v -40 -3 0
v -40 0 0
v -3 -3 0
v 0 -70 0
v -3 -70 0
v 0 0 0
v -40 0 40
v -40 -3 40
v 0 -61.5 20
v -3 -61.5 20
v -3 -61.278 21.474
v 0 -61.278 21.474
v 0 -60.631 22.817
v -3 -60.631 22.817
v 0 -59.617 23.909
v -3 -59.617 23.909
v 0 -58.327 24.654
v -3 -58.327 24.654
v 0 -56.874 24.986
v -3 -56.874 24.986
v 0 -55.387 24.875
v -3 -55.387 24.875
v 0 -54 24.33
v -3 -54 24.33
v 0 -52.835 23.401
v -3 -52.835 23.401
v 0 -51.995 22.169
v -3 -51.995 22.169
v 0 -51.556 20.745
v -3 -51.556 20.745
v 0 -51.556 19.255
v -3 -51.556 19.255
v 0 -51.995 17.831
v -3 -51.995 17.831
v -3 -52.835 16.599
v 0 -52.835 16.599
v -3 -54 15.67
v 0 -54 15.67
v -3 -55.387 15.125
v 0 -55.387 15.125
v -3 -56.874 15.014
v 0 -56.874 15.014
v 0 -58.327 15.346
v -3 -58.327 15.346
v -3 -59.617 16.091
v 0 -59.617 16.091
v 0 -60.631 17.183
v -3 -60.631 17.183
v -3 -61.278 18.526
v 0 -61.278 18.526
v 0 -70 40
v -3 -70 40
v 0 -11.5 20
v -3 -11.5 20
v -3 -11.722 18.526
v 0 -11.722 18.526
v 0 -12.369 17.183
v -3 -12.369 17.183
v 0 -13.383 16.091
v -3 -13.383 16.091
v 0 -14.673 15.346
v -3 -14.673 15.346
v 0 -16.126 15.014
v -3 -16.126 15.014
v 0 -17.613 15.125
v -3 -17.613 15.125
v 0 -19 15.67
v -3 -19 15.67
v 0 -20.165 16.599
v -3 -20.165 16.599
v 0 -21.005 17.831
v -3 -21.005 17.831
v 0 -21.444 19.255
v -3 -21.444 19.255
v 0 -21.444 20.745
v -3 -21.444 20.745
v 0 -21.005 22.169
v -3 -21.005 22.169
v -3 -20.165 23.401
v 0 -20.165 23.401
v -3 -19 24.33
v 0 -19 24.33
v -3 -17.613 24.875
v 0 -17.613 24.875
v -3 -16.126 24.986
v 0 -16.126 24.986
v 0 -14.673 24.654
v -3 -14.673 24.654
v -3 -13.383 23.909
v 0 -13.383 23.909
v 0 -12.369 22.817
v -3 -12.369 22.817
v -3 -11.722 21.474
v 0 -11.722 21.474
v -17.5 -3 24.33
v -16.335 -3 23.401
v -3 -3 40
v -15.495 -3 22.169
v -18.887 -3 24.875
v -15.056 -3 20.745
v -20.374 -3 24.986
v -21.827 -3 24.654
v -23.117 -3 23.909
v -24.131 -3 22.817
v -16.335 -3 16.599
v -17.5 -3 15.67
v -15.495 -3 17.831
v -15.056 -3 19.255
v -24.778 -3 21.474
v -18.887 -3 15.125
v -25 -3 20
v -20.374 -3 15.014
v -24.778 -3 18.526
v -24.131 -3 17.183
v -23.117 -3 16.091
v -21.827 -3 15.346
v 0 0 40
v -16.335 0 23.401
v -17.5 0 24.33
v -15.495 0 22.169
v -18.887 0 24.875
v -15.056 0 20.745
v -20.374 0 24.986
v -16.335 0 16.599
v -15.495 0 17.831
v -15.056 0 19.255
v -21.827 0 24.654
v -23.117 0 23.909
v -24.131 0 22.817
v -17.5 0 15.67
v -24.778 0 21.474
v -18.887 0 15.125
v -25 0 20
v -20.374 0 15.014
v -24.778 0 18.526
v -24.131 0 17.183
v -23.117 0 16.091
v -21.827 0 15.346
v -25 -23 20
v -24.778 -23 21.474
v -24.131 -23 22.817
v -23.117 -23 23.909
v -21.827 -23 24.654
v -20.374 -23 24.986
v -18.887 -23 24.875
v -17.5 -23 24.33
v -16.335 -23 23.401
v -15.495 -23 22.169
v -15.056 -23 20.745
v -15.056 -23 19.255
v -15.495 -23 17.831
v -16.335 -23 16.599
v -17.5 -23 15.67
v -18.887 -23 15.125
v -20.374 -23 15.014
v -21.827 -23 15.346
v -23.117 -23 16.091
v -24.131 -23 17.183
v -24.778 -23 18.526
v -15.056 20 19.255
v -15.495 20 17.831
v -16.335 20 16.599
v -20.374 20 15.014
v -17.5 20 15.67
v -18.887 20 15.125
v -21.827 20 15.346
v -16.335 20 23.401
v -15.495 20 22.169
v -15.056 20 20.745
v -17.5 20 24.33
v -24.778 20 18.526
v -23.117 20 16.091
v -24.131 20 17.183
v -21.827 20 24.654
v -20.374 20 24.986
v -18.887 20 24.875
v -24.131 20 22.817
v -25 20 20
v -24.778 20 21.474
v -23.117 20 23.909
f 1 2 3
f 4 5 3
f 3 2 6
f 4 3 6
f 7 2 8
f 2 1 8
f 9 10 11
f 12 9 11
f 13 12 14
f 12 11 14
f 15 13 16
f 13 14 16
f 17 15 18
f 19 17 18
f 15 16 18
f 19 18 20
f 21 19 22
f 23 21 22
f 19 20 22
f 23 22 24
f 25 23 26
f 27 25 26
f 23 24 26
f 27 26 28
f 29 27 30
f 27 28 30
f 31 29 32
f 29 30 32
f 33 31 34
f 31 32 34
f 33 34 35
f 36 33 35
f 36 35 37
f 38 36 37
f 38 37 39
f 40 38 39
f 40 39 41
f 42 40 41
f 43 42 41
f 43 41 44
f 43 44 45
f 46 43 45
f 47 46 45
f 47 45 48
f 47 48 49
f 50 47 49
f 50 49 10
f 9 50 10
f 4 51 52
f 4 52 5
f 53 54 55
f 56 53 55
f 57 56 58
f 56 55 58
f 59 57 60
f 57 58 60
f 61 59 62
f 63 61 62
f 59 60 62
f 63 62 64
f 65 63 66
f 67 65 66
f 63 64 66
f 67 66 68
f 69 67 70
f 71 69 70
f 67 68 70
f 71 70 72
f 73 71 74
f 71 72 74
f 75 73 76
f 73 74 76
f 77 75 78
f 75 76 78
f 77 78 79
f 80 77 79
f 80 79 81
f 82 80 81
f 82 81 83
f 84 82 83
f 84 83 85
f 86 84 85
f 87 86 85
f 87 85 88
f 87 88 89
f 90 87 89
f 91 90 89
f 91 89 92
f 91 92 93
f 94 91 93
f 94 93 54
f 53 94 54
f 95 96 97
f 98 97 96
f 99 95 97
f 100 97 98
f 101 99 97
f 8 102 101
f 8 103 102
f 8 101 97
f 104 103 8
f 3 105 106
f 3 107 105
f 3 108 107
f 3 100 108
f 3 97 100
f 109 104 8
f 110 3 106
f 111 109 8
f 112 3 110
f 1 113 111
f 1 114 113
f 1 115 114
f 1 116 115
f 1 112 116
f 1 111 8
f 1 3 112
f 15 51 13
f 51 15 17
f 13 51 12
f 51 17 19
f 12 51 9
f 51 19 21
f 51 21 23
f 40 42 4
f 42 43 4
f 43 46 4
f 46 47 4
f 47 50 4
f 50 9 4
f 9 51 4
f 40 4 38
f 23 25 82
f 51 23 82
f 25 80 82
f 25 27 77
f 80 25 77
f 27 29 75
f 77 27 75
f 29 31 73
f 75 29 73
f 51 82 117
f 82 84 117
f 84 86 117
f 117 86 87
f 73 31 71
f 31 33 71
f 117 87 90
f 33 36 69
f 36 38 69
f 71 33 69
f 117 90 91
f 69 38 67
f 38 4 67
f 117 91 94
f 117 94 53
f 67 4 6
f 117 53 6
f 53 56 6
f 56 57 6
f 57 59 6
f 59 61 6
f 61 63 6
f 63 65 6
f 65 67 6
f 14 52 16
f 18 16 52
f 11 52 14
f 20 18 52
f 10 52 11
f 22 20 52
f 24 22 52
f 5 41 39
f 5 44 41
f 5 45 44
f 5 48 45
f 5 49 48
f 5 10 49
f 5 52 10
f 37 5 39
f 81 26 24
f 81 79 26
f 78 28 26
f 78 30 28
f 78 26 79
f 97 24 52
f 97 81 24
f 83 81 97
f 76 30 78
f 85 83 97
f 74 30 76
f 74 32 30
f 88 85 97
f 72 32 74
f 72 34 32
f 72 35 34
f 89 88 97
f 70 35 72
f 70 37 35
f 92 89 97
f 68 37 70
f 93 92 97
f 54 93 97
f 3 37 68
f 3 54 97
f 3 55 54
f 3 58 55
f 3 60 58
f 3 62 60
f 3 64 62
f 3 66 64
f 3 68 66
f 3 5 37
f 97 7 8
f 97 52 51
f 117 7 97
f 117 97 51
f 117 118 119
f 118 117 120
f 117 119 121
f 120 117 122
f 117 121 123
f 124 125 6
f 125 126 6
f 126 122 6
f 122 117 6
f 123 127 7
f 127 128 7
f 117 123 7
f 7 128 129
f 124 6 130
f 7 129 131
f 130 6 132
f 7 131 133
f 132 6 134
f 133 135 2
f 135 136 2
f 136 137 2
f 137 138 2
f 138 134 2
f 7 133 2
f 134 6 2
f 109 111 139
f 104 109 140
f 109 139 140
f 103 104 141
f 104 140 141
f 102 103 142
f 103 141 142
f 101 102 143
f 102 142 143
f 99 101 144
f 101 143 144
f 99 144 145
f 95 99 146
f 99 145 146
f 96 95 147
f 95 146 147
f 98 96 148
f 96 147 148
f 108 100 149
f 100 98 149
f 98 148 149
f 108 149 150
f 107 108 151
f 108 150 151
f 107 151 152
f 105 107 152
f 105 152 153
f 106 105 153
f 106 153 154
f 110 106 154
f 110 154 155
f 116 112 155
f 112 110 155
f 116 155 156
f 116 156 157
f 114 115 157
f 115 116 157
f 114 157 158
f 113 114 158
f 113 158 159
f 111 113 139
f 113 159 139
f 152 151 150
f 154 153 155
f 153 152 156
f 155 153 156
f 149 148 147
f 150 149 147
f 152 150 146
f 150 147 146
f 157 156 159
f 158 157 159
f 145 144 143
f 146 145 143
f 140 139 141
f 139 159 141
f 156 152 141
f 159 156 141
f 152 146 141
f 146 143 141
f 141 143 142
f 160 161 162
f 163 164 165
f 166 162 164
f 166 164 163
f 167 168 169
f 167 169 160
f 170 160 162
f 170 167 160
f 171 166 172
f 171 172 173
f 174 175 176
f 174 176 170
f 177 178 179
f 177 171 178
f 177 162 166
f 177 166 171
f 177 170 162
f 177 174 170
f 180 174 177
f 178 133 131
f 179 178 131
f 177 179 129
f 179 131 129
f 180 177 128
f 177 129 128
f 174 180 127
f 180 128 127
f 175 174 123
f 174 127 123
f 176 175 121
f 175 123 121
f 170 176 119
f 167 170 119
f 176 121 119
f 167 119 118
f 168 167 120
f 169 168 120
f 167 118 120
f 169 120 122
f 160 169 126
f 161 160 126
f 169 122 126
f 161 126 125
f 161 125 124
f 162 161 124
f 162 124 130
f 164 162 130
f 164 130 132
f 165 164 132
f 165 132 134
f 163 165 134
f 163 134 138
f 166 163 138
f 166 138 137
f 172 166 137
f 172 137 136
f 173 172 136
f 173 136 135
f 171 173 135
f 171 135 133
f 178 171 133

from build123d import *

# Parameters (mm, degrees)
SUPERFICIE_EXTRUIR1_1_DEPTH = 40
DAR_ESPESOR1_T1             = 3
EXTRUIR1_DEPTH              = 20
EXTRUIR1_DEPTH_BACK         = 23
CROQUIS2_R                  = 5
CROQUIS3_R                  = 5
EXTRUIR2_DEPTH              = 20


with BuildPart() as body_1:
    # Superficie-Extruir1: a surface, the sketch's curves swept straight by 40 mm
    with BuildLine(Plane.XY, mode=Mode.PRIVATE) as superficie_extruir1_1_path:
        Line((0, -70), (0, 0))
        Line((0, 0), (-40, 0))
    superficie_extruir1_1 = Shell.extrude(superficie_extruir1_1_path.wire(), (0 * SUPERFICIE_EXTRUIR1_1_DEPTH, 0 * SUPERFICIE_EXTRUIR1_1_DEPTH, 1 * SUPERFICIE_EXTRUIR1_1_DEPTH))
    add(Solid.thicken(superficie_extruir1_1, DAR_ESPESOR1_T1))

    # Croquis2 → Extruir1 (add, two sides: drawn at the far end of the back side and taken through both)
    with BuildSketch(Plane(origin=(0, 0, 0), x_dir=(1, 0, 0), z_dir=(0, 1, 0)).offset(-EXTRUIR1_DEPTH_BACK)):
        with Locations(Location((-20, -20, 0), (0, 0, 180))):
            Circle(CROQUIS2_R)
    extrude(amount=EXTRUIR1_DEPTH + EXTRUIR1_DEPTH_BACK)

    # Croquis3 → Extruir2 (cut)
    with BuildSketch(Plane.ZY.offset(3)):
        with Locations(Location((20, -56.5, 0), (0, 0, 270))):
            Circle(CROQUIS3_R)
        with Locations(Location((20, -16.5, 0), (0, 0, 90))):
            Circle(CROQUIS3_R)
    extrude(amount=-EXTRUIR2_DEPTH, mode=Mode.SUBTRACT)


solid = body_1.part
